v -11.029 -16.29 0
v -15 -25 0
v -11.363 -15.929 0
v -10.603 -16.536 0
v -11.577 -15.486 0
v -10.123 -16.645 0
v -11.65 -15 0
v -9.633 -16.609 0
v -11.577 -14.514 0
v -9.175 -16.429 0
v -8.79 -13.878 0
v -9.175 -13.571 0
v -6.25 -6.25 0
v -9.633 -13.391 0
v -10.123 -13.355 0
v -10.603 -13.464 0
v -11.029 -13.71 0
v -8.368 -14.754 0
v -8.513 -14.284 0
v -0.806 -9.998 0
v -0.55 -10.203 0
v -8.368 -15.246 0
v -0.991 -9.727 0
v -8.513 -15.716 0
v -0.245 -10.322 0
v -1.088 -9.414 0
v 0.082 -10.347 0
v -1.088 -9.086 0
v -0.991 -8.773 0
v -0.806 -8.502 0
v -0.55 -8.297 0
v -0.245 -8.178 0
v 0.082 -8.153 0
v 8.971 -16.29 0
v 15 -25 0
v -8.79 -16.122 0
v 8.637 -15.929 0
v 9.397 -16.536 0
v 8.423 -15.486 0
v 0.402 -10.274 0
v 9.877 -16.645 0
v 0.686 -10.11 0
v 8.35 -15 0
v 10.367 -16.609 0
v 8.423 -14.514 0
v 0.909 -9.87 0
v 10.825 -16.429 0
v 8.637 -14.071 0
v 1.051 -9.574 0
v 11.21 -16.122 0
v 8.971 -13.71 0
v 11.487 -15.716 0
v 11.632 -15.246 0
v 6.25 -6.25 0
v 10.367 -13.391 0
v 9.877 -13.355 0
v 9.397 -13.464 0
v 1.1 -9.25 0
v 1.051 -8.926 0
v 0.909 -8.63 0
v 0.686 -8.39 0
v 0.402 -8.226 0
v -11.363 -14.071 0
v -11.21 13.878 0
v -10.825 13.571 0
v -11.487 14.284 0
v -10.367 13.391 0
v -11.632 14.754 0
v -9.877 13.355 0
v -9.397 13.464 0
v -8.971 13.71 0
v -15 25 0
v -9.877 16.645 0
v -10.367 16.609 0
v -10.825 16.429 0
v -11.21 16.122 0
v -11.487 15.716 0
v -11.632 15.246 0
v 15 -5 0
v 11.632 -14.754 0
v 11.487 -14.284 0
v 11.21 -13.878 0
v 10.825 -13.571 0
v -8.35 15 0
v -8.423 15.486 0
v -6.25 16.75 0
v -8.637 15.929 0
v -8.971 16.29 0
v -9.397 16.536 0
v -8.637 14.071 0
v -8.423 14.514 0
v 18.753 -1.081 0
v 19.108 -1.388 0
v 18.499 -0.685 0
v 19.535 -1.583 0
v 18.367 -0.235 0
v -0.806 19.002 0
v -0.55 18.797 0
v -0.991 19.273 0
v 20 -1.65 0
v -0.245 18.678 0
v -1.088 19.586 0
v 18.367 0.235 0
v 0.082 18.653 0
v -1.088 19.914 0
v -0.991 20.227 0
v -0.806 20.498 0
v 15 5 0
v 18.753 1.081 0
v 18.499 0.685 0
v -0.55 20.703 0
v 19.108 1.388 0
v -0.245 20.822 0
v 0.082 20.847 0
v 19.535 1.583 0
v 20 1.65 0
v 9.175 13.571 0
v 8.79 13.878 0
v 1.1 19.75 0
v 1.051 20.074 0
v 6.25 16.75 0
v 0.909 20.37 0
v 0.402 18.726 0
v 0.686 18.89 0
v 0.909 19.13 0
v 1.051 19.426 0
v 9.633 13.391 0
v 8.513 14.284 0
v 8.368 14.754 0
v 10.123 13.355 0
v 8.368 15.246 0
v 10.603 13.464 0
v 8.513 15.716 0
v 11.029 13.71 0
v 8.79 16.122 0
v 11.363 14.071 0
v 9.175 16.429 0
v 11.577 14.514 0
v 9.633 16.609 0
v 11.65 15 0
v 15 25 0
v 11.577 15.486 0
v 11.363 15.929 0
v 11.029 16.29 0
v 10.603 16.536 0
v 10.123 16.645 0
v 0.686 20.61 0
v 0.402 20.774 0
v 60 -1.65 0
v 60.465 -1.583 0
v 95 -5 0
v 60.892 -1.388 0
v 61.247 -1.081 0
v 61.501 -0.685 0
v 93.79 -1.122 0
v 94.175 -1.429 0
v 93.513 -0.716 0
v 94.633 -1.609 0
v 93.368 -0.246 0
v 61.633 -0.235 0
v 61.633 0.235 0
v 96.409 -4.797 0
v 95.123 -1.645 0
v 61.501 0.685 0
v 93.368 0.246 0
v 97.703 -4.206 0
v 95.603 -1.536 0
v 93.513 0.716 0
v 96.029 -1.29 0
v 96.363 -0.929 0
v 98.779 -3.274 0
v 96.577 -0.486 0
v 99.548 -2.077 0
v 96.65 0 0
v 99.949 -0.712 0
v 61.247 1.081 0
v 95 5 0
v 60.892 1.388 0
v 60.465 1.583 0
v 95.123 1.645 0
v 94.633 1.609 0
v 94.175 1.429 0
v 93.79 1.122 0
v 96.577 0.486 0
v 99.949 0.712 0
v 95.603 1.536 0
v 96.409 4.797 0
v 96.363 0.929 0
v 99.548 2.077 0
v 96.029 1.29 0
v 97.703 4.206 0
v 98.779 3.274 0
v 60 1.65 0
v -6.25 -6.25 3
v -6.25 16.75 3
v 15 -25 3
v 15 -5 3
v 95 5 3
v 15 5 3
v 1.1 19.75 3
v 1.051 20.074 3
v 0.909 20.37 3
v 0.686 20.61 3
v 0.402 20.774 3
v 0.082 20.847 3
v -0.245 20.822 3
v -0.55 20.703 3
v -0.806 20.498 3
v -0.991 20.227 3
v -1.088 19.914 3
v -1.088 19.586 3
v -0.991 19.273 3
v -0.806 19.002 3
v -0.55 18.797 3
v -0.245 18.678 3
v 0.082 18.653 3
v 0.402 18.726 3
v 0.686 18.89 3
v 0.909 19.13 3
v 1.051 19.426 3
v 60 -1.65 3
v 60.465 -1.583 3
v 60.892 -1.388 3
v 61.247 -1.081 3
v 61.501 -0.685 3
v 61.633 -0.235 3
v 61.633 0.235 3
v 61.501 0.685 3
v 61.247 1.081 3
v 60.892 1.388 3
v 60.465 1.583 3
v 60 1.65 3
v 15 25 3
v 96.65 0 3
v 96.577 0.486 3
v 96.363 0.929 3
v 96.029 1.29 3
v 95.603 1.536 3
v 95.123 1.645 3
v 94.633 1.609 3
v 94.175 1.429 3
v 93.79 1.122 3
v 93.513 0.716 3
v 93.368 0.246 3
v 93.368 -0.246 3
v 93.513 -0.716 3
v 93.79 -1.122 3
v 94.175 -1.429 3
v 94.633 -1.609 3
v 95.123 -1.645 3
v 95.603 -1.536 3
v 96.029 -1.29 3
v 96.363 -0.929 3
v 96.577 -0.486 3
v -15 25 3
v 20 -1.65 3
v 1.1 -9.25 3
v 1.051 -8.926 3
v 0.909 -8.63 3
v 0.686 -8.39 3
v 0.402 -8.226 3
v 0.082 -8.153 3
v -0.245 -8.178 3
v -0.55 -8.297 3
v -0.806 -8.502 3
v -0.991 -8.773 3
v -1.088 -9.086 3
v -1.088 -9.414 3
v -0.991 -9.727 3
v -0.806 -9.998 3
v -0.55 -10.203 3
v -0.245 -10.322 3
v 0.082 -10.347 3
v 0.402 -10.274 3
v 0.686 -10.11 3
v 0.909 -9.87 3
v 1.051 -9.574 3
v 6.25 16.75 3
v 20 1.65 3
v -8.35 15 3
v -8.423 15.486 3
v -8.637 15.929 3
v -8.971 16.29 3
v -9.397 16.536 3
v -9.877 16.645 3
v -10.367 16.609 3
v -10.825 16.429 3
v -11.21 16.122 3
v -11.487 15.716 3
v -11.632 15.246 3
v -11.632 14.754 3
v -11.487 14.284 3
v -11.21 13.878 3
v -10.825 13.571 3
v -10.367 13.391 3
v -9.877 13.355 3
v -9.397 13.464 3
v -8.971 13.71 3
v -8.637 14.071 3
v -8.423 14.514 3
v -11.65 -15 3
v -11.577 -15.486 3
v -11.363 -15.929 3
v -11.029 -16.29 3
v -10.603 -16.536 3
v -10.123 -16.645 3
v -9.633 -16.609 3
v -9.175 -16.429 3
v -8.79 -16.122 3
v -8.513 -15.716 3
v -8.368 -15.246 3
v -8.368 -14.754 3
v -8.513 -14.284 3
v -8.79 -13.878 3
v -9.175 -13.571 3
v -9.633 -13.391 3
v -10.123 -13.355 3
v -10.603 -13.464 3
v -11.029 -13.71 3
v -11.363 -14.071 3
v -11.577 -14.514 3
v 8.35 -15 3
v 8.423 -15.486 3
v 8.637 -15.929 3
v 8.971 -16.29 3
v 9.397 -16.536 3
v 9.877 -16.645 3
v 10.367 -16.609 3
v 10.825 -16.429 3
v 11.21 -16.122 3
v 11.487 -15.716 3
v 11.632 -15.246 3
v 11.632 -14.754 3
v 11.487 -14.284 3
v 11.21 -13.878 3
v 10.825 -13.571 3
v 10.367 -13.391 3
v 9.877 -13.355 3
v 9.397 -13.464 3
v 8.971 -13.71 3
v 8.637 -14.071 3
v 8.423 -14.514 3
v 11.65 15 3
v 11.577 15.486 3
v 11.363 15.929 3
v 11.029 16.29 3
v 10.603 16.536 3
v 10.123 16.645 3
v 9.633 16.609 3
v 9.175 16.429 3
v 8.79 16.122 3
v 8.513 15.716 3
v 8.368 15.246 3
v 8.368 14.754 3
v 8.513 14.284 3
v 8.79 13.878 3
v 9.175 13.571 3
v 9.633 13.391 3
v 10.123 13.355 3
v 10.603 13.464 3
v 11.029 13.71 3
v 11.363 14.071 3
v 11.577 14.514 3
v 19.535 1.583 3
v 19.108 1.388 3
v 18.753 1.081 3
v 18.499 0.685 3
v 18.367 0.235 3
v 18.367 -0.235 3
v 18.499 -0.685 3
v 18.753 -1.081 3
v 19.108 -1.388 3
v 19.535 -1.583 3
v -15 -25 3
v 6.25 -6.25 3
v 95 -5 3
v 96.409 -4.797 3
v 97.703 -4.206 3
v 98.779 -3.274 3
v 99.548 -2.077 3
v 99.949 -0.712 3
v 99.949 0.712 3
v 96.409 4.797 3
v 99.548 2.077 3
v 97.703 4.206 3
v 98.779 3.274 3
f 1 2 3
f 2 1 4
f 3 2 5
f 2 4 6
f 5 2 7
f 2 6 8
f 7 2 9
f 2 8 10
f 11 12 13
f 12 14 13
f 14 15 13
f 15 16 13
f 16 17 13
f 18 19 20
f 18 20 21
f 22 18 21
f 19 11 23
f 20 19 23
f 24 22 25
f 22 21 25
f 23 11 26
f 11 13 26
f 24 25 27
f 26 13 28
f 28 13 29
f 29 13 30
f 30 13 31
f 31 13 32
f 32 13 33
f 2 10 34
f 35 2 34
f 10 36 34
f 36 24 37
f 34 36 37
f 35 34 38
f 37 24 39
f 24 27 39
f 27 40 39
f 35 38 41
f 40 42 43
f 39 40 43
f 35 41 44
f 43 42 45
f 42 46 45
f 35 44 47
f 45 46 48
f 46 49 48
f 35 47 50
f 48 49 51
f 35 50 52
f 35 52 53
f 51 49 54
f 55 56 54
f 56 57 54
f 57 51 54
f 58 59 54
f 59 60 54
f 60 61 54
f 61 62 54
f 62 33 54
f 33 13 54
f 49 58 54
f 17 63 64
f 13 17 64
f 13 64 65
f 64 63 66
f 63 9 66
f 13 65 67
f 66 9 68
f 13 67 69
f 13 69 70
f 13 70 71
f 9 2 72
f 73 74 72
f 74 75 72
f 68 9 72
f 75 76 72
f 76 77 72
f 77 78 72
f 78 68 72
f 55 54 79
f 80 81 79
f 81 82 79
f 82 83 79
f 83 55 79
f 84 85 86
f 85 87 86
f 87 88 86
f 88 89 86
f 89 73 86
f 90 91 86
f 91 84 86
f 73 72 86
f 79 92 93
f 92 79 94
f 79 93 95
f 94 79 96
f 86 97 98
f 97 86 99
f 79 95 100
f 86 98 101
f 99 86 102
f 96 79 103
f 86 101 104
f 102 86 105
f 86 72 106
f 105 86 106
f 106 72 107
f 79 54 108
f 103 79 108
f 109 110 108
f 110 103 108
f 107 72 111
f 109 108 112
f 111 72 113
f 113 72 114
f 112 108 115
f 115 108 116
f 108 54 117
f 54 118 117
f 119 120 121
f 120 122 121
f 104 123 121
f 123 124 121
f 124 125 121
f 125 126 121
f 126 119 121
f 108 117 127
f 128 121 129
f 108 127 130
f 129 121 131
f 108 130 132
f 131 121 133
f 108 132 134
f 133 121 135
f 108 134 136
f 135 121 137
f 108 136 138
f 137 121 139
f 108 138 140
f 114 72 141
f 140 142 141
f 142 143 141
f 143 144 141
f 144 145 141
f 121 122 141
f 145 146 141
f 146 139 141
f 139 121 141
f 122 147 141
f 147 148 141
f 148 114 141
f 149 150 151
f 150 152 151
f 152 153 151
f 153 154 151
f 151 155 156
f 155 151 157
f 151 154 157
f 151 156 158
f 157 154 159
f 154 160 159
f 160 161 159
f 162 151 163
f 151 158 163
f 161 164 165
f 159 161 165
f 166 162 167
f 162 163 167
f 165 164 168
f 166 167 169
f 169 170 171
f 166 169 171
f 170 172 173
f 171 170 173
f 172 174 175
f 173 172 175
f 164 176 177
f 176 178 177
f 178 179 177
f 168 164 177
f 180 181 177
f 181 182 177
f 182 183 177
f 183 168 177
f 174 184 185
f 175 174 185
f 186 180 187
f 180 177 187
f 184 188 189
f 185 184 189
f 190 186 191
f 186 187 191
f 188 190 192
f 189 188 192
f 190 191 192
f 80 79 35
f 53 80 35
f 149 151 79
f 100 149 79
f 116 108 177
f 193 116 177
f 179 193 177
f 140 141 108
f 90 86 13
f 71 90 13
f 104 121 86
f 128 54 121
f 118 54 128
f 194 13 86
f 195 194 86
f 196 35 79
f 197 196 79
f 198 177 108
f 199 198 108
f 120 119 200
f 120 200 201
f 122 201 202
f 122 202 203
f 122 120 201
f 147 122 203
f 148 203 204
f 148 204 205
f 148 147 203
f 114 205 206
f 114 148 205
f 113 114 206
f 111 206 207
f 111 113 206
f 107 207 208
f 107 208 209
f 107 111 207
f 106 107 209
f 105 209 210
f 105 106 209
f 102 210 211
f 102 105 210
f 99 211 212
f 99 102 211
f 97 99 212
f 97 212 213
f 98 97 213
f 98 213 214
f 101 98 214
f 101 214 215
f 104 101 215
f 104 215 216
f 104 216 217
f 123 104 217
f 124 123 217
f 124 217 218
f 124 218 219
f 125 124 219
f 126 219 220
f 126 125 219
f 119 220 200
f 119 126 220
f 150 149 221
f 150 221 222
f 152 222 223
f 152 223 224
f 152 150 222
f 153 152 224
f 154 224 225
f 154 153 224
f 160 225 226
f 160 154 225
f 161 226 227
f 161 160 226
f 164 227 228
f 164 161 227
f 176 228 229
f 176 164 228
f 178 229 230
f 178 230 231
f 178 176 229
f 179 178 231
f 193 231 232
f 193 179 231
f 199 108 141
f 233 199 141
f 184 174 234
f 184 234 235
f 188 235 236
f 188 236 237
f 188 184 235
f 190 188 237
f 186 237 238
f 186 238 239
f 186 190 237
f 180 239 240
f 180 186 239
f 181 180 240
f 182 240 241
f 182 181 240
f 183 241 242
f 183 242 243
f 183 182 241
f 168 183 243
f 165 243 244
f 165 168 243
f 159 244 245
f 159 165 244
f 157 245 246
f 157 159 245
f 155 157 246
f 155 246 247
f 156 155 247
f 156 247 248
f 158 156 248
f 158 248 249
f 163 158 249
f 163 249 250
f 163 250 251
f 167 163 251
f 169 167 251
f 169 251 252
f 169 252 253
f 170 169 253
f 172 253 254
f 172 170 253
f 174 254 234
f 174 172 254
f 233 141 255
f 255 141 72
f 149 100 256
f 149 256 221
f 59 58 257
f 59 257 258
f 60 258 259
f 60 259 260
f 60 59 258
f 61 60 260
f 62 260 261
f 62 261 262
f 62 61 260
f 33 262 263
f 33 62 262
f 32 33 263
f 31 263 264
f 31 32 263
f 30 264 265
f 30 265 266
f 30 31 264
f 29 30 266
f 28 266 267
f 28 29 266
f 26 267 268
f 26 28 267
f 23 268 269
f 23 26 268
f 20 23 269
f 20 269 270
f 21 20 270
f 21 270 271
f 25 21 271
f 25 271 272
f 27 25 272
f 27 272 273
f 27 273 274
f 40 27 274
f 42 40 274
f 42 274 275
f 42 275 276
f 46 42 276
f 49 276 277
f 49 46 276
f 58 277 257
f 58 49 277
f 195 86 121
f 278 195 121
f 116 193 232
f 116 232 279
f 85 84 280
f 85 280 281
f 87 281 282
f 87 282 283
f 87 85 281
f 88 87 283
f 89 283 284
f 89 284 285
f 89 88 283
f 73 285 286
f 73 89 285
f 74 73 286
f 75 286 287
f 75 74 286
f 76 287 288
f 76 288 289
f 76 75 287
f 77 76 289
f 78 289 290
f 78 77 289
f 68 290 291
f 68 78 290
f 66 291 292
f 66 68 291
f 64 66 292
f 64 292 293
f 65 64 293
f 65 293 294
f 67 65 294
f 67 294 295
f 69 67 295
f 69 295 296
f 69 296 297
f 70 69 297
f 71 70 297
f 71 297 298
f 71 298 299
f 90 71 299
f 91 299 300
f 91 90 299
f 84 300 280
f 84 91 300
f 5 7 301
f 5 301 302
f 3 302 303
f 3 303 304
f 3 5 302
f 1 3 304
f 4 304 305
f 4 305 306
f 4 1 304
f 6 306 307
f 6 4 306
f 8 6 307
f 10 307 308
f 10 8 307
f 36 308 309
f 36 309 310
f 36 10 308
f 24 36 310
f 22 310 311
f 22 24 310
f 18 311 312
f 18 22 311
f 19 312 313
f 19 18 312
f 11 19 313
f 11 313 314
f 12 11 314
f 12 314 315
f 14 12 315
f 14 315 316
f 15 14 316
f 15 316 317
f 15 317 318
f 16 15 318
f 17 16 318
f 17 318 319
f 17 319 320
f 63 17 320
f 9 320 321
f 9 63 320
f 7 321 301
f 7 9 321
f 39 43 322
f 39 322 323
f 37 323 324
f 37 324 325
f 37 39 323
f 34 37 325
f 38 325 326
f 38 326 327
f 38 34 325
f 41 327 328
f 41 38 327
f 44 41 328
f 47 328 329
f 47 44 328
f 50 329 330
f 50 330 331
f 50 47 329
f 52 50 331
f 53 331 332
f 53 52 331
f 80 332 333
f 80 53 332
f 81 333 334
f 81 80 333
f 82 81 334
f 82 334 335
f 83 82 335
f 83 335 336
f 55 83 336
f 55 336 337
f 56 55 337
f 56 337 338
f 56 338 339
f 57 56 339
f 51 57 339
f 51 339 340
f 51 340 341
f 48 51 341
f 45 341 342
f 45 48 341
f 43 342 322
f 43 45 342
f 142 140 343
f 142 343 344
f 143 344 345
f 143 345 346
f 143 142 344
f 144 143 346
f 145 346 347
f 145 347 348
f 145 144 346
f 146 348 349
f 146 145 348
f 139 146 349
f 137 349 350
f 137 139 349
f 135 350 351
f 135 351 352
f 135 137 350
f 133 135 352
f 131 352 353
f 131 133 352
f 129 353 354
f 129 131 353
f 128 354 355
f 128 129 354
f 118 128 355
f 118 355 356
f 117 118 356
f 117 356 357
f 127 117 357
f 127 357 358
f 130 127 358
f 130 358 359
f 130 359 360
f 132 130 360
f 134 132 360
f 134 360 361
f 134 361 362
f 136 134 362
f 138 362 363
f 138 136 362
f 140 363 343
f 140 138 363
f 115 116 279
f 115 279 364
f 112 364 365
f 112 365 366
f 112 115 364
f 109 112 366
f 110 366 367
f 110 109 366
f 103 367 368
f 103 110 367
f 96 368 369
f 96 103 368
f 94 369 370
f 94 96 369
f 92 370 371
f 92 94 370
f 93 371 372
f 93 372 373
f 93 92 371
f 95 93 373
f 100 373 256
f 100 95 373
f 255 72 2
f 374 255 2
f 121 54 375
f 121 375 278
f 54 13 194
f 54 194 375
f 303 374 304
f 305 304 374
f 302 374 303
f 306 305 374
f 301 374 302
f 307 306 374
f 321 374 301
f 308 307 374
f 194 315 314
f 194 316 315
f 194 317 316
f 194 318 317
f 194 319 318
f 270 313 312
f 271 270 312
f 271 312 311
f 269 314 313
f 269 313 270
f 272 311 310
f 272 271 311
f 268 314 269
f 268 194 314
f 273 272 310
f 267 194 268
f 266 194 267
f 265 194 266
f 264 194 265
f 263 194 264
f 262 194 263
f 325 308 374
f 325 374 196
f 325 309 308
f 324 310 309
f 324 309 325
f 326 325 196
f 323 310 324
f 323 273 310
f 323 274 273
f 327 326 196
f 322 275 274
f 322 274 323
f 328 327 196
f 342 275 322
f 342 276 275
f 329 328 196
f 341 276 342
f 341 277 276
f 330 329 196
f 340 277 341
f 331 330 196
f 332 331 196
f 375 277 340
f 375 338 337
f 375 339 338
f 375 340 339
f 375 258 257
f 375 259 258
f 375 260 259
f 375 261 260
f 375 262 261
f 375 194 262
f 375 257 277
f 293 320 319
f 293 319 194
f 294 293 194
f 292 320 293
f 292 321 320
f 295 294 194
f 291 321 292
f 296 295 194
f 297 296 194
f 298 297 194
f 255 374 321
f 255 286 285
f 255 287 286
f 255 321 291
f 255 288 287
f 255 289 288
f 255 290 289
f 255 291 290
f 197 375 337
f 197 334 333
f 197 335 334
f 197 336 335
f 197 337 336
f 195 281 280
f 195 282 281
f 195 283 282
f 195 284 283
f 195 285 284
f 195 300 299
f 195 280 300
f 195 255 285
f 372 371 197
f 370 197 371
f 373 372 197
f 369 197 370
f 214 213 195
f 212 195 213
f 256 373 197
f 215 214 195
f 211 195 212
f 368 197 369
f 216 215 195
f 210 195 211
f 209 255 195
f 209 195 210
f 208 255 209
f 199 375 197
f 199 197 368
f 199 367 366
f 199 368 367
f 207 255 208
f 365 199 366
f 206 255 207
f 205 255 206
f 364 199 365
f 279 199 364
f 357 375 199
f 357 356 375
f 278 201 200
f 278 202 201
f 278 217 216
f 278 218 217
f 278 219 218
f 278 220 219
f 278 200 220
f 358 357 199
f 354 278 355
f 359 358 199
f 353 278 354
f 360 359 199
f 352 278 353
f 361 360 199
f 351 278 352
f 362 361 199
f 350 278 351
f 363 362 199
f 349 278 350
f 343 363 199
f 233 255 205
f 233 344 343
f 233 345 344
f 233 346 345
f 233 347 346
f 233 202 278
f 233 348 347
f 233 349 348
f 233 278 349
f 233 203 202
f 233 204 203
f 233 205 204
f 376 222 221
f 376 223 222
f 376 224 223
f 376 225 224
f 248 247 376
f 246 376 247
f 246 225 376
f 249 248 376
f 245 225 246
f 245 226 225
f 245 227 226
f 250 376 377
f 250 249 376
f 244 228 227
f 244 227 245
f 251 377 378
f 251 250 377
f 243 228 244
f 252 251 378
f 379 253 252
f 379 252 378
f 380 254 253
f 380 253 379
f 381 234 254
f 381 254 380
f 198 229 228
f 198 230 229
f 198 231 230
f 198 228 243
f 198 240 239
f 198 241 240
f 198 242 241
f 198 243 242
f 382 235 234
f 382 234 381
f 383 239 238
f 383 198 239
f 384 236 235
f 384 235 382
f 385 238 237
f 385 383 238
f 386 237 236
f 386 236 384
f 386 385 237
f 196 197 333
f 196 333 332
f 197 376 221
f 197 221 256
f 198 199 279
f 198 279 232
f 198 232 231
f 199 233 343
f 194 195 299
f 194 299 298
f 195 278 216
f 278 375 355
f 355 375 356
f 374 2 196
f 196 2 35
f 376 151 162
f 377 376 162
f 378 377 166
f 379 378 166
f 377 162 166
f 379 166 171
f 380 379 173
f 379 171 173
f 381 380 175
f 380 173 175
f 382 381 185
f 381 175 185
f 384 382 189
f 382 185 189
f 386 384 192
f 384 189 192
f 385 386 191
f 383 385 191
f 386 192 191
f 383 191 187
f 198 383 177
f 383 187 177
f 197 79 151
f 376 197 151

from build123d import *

# Parameters (mm, degrees)
SKETCH_1_R      = 1.1
SKETCH_1_R_2    = 1.65
SKETCH_1_W      = 12.5
SKETCH_1_H      = 23
EXTRUDE_1_DEPTH = 3


with BuildPart() as part:
    # 草图1 → 凸台-拉伸1 (new body)
    with BuildSketch(Plane.XY):
        with BuildLine():
            Line((15, -25), (15, -5))
            Line((15, -5), (95, -5))
            ThreePointArc((95, -5), (100, 0), (95, 5))
            Line((95, 5), (15, 5))
            Line((15, 5), (15, 25))
            Line((15, 25), (-15, 25))
            Line((-15, 25), (-15, -25))
            Line((-15, -25), (15, -25))
        make_face()
        with Locations((0, 19.75)):
            Circle(SKETCH_1_R, mode=Mode.SUBTRACT)
        with Locations((0, -9.25)):
            Circle(SKETCH_1_R, mode=Mode.SUBTRACT)
        with Locations((95, 0)):
            Circle(SKETCH_1_R_2, mode=Mode.SUBTRACT)
        with Locations((10, 15)):
            Circle(SKETCH_1_R_2, mode=Mode.SUBTRACT)
        with Locations((-10, 15)):
            Circle(SKETCH_1_R_2, mode=Mode.SUBTRACT)
        with Locations(Location((10, -15, 0), (0, 0, 180))):
            Circle(SKETCH_1_R_2, mode=Mode.SUBTRACT)
        with Locations(Location((-10, -15, 0), (0, 0, 180))):
            Circle(SKETCH_1_R_2, mode=Mode.SUBTRACT)
        with Locations((0, 5.25)):
            Rectangle(SKETCH_1_W, SKETCH_1_H, mode=Mode.SUBTRACT)
        with BuildLine():
            Line((20, -1.65), (60, -1.65))
            ThreePointArc((60, -1.65), (61.65, 0), (60, 1.65))
            Line((60, 1.65), (20, 1.65))
            ThreePointArc((20, 1.65), (18.35, 0), (20, -1.65))
        make_face(mode=Mode.SUBTRACT)
    extrude(amount=EXTRUDE_1_DEPTH)


solid = part.part
